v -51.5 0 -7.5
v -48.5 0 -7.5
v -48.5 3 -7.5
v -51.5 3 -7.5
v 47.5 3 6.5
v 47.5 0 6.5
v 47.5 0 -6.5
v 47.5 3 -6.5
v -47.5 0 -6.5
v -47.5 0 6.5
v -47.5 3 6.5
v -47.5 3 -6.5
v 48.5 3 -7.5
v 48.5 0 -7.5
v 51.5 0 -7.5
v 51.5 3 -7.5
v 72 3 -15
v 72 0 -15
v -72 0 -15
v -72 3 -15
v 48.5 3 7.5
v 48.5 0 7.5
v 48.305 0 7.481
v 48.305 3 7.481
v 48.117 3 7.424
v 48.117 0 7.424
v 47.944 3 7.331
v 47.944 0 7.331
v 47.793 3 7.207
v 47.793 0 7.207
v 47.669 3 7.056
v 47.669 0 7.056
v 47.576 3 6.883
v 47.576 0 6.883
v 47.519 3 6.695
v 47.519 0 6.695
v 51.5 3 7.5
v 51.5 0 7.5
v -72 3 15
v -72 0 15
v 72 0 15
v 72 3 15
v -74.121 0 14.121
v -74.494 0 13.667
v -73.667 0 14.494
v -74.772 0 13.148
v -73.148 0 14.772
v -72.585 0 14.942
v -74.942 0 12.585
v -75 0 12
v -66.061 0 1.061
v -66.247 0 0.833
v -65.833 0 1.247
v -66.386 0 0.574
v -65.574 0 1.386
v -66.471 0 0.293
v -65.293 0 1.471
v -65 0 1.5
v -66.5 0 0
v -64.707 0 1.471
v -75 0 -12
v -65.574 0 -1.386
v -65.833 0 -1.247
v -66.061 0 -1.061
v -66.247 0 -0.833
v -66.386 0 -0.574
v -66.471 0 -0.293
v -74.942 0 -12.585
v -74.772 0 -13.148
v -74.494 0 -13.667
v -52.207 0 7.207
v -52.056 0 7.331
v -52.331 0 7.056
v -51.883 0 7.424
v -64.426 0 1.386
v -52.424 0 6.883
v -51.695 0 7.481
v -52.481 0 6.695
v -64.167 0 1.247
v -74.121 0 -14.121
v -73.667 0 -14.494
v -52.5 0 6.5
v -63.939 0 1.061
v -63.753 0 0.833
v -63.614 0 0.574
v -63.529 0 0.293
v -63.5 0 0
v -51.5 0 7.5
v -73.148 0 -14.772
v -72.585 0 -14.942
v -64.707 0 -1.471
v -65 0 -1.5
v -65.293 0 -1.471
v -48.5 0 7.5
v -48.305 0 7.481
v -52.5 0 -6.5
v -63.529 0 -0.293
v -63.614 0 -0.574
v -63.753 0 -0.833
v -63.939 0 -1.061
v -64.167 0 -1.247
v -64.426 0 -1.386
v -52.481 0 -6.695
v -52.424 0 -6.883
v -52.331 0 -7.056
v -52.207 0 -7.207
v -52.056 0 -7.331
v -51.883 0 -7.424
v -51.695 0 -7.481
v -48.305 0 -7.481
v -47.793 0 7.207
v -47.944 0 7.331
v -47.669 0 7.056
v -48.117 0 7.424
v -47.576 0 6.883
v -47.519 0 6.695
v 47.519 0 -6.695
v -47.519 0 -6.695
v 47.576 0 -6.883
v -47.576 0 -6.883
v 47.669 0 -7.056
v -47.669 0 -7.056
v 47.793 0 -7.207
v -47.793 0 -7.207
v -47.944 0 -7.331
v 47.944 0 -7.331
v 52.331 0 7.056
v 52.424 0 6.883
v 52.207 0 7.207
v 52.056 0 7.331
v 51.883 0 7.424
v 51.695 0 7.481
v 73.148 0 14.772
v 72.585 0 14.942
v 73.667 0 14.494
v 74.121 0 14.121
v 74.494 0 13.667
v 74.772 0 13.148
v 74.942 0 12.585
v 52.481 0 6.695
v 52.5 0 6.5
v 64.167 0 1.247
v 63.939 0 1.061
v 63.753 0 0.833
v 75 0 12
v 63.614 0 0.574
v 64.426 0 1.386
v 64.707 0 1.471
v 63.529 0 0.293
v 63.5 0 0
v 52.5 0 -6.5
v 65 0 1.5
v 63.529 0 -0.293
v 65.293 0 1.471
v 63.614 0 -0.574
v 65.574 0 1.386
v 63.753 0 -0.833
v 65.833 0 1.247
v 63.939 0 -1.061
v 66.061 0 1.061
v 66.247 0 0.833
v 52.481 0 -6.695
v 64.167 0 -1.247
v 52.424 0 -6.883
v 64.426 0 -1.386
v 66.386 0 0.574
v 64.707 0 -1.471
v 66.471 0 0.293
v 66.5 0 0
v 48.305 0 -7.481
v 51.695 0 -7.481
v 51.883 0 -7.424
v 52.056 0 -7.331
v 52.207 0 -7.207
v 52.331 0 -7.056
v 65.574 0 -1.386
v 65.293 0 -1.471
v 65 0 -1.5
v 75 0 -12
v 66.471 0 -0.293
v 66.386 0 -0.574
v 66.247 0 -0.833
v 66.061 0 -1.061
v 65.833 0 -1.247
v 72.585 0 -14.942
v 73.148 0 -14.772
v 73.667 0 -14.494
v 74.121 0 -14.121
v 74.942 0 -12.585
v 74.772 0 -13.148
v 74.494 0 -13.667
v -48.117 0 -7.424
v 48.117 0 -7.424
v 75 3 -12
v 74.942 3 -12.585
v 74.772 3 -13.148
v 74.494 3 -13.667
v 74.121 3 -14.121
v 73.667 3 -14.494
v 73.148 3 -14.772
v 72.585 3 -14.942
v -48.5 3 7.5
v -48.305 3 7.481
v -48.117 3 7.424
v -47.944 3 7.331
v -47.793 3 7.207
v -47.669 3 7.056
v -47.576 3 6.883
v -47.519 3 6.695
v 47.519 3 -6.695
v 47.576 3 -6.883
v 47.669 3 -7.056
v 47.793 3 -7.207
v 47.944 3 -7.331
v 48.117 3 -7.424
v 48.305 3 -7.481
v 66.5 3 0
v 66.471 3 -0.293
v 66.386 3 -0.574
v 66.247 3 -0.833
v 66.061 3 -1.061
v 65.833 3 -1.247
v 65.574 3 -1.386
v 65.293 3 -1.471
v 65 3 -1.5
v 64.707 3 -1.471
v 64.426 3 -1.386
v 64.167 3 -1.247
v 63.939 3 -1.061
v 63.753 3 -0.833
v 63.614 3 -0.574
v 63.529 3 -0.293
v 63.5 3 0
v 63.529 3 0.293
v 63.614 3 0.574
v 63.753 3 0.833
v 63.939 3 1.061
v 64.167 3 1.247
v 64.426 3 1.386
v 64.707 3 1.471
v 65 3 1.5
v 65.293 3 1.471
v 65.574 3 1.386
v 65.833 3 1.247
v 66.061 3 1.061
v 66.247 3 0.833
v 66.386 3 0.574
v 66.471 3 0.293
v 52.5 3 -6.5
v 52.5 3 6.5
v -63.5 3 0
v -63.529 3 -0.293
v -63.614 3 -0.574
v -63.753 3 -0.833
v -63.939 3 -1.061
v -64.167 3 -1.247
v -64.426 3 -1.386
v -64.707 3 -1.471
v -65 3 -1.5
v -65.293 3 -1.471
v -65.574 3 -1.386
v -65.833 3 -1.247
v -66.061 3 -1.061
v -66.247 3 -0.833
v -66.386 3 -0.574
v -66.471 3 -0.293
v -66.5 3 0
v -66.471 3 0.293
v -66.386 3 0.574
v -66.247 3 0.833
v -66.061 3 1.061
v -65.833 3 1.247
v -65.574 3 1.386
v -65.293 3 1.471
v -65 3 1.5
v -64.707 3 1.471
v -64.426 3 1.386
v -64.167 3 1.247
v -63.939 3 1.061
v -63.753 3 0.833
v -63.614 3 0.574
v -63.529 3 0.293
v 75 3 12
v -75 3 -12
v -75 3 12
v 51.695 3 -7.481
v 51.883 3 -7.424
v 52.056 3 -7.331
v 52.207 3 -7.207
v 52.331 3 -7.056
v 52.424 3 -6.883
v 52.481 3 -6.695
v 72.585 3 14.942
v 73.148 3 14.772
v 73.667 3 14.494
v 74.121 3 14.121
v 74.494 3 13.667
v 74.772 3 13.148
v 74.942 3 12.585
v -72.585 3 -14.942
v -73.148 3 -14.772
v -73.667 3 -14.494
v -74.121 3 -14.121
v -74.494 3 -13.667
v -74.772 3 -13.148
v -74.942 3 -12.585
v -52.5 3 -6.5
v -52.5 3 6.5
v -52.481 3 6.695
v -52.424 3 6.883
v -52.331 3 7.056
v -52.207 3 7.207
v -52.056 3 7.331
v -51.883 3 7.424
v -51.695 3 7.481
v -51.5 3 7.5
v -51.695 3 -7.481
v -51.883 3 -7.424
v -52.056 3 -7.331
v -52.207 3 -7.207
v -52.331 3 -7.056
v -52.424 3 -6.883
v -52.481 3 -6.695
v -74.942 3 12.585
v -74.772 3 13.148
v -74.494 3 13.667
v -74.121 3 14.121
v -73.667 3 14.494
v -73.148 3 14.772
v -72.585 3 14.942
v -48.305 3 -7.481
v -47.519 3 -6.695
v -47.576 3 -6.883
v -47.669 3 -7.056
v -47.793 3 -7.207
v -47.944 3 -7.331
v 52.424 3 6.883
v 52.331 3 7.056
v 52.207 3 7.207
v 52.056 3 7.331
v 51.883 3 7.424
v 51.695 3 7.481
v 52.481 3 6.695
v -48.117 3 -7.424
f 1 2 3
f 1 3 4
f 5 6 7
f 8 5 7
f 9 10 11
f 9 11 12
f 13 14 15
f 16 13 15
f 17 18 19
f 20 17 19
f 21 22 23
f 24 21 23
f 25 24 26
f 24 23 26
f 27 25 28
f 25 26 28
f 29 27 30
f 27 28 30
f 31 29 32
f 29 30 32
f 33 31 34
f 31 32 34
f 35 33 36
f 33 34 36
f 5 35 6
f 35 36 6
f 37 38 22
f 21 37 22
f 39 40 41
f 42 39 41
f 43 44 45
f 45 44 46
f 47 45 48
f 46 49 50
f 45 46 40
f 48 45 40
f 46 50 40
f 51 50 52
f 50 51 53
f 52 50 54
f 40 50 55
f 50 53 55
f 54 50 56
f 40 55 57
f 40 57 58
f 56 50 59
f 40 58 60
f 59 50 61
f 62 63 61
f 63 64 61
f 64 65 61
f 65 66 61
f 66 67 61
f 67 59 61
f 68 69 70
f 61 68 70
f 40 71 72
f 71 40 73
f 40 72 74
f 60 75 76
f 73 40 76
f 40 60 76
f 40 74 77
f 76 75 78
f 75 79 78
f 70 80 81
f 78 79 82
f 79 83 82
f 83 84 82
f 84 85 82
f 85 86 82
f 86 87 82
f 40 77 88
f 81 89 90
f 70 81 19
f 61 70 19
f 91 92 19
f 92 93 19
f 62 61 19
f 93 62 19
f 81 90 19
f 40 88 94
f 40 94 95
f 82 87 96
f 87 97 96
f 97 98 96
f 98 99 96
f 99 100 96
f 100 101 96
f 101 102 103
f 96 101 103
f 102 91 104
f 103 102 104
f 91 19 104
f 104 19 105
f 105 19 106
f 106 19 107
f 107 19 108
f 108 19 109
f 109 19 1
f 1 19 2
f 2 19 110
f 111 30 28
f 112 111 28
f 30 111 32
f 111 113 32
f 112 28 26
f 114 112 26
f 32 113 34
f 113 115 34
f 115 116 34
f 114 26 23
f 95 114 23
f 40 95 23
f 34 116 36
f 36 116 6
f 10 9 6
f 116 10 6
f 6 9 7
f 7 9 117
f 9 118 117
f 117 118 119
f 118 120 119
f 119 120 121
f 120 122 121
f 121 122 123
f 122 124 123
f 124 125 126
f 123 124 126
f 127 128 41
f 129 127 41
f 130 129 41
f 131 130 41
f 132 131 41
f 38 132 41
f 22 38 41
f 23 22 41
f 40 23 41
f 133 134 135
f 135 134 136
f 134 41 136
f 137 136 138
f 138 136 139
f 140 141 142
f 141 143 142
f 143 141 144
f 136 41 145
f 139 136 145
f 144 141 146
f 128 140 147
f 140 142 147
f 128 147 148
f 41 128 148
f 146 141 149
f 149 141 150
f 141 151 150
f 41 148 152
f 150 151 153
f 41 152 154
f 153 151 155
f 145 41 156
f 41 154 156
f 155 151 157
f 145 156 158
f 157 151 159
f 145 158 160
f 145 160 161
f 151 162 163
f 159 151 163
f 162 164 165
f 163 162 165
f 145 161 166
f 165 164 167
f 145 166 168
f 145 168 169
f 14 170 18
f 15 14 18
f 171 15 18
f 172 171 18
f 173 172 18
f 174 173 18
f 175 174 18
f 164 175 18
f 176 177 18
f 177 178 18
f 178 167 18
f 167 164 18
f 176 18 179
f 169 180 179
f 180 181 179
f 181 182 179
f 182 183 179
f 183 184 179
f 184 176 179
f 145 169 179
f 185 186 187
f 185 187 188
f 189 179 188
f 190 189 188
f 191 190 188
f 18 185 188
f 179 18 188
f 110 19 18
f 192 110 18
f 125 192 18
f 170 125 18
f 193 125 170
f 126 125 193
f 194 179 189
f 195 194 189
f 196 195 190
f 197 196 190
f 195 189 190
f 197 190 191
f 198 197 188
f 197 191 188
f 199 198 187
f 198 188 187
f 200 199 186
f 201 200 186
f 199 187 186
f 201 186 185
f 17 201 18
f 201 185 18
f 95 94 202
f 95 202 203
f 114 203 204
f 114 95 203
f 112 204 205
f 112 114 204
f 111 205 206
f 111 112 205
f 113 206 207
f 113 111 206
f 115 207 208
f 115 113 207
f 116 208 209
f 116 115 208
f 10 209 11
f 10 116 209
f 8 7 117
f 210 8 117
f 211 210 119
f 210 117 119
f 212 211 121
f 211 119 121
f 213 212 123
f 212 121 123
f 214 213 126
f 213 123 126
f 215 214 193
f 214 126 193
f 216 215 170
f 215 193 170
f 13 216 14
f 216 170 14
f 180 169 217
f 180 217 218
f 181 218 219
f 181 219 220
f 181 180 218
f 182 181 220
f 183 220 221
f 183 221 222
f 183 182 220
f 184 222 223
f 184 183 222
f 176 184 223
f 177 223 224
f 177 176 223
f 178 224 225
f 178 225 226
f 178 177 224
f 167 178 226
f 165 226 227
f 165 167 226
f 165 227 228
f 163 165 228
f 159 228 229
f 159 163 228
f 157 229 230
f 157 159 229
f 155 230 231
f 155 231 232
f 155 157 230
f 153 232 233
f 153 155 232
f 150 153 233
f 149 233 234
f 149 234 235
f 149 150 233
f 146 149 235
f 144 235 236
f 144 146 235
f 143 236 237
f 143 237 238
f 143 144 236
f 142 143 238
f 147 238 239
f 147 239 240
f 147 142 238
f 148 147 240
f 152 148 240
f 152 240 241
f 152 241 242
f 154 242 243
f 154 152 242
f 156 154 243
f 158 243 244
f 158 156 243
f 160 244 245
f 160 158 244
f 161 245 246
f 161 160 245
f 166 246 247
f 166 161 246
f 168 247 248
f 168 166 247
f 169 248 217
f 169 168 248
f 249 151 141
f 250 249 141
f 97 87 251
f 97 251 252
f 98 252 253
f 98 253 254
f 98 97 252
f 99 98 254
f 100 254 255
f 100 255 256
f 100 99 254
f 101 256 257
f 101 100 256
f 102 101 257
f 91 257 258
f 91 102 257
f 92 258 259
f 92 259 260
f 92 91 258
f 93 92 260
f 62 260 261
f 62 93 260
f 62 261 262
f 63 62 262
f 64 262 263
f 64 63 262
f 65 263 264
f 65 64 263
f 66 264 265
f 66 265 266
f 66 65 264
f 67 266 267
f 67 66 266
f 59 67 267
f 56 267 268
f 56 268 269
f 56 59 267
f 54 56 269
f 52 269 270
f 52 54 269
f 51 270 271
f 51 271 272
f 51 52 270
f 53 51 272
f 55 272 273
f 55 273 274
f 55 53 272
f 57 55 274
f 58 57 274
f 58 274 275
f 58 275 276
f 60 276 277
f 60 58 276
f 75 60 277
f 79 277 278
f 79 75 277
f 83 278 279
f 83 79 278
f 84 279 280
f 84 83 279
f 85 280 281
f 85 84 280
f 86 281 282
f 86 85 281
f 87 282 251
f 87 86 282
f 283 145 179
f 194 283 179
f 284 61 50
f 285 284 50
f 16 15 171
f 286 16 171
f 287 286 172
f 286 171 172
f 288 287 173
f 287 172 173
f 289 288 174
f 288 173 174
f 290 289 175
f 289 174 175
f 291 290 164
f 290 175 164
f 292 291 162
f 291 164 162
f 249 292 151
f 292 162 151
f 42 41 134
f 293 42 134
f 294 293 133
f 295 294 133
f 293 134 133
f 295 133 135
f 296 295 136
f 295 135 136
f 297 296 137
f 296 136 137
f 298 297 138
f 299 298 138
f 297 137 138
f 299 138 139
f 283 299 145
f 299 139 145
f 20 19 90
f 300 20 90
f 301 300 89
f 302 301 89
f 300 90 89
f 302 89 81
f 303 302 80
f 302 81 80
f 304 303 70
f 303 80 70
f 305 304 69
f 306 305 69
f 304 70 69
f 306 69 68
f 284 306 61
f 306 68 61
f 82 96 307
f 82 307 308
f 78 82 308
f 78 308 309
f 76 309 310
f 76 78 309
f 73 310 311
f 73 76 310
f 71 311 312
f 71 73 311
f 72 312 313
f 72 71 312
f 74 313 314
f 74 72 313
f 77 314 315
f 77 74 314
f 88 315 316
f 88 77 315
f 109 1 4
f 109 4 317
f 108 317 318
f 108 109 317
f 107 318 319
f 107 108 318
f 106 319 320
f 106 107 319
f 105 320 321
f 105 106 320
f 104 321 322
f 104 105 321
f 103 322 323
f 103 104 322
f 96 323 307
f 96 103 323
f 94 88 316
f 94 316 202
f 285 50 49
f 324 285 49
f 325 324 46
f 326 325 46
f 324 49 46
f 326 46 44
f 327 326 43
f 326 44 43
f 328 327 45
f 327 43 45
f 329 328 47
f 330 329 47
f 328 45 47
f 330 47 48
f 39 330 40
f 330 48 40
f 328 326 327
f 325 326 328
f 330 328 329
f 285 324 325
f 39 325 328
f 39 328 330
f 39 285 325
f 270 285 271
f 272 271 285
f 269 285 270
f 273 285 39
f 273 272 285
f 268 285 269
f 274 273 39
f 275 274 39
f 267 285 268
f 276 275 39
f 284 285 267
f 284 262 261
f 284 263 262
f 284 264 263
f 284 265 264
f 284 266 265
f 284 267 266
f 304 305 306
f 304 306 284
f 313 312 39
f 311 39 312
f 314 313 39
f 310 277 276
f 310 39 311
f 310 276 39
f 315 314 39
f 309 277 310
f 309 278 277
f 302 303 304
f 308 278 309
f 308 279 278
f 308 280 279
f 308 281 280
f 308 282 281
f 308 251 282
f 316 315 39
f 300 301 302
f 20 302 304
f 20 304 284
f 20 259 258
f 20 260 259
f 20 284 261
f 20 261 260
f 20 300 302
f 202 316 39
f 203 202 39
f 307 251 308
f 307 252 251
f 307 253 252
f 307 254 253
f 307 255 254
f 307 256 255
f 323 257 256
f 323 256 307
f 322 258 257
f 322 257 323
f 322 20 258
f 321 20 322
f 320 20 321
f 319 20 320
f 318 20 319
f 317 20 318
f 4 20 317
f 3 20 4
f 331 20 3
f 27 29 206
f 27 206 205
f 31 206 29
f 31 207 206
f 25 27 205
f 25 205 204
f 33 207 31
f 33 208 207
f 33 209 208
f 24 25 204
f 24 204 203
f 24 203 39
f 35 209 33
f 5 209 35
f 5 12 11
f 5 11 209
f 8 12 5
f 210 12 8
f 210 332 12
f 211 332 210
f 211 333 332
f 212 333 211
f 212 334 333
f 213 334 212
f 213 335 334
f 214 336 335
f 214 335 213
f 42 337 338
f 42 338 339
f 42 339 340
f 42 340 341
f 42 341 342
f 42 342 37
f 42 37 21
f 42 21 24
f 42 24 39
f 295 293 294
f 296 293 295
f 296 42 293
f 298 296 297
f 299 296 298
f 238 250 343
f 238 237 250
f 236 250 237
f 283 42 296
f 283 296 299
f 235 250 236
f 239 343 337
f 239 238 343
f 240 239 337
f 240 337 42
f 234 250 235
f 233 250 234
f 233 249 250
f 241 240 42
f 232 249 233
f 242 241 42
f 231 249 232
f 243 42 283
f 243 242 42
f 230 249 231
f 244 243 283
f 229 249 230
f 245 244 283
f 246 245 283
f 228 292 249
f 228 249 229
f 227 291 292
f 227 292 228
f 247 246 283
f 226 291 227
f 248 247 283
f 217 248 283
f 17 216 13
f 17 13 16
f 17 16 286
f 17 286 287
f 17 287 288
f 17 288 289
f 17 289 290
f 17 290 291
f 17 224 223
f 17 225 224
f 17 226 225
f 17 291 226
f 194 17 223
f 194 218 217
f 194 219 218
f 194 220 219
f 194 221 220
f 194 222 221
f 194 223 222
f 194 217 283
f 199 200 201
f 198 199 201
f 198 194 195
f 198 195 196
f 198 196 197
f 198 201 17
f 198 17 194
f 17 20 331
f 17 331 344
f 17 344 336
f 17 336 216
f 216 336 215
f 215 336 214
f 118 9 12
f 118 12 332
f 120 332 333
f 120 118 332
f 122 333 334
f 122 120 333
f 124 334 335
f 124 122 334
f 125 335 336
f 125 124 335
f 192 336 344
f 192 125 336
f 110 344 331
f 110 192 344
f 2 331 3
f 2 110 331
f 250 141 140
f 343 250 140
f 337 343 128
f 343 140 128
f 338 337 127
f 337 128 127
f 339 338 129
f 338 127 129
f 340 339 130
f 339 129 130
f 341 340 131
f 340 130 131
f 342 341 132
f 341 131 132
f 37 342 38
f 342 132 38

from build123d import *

# Parameters (mm, degrees)
SKETCH1_R           = 1.5
BOSS_EXTRUDE1_DEPTH = 3


with BuildPart() as part:
    # Sketch1 → Boss-Extrude1 (new body)
    with BuildSketch(Plane(origin=(0, 0, 0), x_dir=(1, 0, 0), z_dir=(0, 1, 0))):
        with BuildLine():
            Line((72, 15), (-72, 15))
            ThreePointArc((-72, 15), (-74.121320344, 14.121320344), (-75, 12))
            Line((-75, 12), (-75, -12))
            ThreePointArc((-75, -12), (-74.121320344, -14.121320344), (-72, -15))
            Line((-72, -15), (72, -15))
            ThreePointArc((72, -15), (74.121320344, -14.121320344), (75, -12))
            Line((75, -12), (75, 12))
            ThreePointArc((75, 12), (74.121320344, 14.121320344), (72, 15))
        make_face()
        with Locations((65, 0)):
            Circle(SKETCH1_R, mode=Mode.SUBTRACT)
        with Locations((-65, 0)):
            Circle(SKETCH1_R, mode=Mode.SUBTRACT)
        with BuildLine():
            Line((51.5, -7.5), (48.5, -7.5))
            ThreePointArc((48.5, -7.5), (47.792893219, -7.207106781), (47.5, -6.5))
            Line((47.5, -6.5), (47.5, 6.5))
            ThreePointArc((47.5, 6.5), (47.792893219, 7.207106781), (48.5, 7.5))
            Line((48.5, 7.5), (51.5, 7.5))
            ThreePointArc((51.5, 7.5), (52.207106781, 7.207106781), (52.5, 6.5))
            Line((52.5, 6.5), (52.5, -6.5))
            ThreePointArc((52.5, -6.5), (52.207106781, -7.207106781), (51.5, -7.5))
        make_face(mode=Mode.SUBTRACT)
        with BuildLine():
            Line((-47.5, -6.5), (-47.5, 6.5))
            ThreePointArc((-47.5, 6.5), (-47.792893219, 7.207106781), (-48.5, 7.5))
            Line((-48.5, 7.5), (-51.5, 7.5))
            ThreePointArc((-51.5, 7.5), (-52.207106781, 7.207106781), (-52.5, 6.5))
            Line((-52.5, 6.5), (-52.5, -6.5))
            ThreePointArc((-52.5, -6.5), (-52.207106781, -7.207106781), (-51.5, -7.5))
            Line((-51.5, -7.5), (-48.5, -7.5))
            ThreePointArc((-48.5, -7.5), (-47.792893219, -7.207106781), (-47.5, -6.5))
        make_face(mode=Mode.SUBTRACT)
    extrude(amount=BOSS_EXTRUDE1_DEPTH)


solid = part.part
